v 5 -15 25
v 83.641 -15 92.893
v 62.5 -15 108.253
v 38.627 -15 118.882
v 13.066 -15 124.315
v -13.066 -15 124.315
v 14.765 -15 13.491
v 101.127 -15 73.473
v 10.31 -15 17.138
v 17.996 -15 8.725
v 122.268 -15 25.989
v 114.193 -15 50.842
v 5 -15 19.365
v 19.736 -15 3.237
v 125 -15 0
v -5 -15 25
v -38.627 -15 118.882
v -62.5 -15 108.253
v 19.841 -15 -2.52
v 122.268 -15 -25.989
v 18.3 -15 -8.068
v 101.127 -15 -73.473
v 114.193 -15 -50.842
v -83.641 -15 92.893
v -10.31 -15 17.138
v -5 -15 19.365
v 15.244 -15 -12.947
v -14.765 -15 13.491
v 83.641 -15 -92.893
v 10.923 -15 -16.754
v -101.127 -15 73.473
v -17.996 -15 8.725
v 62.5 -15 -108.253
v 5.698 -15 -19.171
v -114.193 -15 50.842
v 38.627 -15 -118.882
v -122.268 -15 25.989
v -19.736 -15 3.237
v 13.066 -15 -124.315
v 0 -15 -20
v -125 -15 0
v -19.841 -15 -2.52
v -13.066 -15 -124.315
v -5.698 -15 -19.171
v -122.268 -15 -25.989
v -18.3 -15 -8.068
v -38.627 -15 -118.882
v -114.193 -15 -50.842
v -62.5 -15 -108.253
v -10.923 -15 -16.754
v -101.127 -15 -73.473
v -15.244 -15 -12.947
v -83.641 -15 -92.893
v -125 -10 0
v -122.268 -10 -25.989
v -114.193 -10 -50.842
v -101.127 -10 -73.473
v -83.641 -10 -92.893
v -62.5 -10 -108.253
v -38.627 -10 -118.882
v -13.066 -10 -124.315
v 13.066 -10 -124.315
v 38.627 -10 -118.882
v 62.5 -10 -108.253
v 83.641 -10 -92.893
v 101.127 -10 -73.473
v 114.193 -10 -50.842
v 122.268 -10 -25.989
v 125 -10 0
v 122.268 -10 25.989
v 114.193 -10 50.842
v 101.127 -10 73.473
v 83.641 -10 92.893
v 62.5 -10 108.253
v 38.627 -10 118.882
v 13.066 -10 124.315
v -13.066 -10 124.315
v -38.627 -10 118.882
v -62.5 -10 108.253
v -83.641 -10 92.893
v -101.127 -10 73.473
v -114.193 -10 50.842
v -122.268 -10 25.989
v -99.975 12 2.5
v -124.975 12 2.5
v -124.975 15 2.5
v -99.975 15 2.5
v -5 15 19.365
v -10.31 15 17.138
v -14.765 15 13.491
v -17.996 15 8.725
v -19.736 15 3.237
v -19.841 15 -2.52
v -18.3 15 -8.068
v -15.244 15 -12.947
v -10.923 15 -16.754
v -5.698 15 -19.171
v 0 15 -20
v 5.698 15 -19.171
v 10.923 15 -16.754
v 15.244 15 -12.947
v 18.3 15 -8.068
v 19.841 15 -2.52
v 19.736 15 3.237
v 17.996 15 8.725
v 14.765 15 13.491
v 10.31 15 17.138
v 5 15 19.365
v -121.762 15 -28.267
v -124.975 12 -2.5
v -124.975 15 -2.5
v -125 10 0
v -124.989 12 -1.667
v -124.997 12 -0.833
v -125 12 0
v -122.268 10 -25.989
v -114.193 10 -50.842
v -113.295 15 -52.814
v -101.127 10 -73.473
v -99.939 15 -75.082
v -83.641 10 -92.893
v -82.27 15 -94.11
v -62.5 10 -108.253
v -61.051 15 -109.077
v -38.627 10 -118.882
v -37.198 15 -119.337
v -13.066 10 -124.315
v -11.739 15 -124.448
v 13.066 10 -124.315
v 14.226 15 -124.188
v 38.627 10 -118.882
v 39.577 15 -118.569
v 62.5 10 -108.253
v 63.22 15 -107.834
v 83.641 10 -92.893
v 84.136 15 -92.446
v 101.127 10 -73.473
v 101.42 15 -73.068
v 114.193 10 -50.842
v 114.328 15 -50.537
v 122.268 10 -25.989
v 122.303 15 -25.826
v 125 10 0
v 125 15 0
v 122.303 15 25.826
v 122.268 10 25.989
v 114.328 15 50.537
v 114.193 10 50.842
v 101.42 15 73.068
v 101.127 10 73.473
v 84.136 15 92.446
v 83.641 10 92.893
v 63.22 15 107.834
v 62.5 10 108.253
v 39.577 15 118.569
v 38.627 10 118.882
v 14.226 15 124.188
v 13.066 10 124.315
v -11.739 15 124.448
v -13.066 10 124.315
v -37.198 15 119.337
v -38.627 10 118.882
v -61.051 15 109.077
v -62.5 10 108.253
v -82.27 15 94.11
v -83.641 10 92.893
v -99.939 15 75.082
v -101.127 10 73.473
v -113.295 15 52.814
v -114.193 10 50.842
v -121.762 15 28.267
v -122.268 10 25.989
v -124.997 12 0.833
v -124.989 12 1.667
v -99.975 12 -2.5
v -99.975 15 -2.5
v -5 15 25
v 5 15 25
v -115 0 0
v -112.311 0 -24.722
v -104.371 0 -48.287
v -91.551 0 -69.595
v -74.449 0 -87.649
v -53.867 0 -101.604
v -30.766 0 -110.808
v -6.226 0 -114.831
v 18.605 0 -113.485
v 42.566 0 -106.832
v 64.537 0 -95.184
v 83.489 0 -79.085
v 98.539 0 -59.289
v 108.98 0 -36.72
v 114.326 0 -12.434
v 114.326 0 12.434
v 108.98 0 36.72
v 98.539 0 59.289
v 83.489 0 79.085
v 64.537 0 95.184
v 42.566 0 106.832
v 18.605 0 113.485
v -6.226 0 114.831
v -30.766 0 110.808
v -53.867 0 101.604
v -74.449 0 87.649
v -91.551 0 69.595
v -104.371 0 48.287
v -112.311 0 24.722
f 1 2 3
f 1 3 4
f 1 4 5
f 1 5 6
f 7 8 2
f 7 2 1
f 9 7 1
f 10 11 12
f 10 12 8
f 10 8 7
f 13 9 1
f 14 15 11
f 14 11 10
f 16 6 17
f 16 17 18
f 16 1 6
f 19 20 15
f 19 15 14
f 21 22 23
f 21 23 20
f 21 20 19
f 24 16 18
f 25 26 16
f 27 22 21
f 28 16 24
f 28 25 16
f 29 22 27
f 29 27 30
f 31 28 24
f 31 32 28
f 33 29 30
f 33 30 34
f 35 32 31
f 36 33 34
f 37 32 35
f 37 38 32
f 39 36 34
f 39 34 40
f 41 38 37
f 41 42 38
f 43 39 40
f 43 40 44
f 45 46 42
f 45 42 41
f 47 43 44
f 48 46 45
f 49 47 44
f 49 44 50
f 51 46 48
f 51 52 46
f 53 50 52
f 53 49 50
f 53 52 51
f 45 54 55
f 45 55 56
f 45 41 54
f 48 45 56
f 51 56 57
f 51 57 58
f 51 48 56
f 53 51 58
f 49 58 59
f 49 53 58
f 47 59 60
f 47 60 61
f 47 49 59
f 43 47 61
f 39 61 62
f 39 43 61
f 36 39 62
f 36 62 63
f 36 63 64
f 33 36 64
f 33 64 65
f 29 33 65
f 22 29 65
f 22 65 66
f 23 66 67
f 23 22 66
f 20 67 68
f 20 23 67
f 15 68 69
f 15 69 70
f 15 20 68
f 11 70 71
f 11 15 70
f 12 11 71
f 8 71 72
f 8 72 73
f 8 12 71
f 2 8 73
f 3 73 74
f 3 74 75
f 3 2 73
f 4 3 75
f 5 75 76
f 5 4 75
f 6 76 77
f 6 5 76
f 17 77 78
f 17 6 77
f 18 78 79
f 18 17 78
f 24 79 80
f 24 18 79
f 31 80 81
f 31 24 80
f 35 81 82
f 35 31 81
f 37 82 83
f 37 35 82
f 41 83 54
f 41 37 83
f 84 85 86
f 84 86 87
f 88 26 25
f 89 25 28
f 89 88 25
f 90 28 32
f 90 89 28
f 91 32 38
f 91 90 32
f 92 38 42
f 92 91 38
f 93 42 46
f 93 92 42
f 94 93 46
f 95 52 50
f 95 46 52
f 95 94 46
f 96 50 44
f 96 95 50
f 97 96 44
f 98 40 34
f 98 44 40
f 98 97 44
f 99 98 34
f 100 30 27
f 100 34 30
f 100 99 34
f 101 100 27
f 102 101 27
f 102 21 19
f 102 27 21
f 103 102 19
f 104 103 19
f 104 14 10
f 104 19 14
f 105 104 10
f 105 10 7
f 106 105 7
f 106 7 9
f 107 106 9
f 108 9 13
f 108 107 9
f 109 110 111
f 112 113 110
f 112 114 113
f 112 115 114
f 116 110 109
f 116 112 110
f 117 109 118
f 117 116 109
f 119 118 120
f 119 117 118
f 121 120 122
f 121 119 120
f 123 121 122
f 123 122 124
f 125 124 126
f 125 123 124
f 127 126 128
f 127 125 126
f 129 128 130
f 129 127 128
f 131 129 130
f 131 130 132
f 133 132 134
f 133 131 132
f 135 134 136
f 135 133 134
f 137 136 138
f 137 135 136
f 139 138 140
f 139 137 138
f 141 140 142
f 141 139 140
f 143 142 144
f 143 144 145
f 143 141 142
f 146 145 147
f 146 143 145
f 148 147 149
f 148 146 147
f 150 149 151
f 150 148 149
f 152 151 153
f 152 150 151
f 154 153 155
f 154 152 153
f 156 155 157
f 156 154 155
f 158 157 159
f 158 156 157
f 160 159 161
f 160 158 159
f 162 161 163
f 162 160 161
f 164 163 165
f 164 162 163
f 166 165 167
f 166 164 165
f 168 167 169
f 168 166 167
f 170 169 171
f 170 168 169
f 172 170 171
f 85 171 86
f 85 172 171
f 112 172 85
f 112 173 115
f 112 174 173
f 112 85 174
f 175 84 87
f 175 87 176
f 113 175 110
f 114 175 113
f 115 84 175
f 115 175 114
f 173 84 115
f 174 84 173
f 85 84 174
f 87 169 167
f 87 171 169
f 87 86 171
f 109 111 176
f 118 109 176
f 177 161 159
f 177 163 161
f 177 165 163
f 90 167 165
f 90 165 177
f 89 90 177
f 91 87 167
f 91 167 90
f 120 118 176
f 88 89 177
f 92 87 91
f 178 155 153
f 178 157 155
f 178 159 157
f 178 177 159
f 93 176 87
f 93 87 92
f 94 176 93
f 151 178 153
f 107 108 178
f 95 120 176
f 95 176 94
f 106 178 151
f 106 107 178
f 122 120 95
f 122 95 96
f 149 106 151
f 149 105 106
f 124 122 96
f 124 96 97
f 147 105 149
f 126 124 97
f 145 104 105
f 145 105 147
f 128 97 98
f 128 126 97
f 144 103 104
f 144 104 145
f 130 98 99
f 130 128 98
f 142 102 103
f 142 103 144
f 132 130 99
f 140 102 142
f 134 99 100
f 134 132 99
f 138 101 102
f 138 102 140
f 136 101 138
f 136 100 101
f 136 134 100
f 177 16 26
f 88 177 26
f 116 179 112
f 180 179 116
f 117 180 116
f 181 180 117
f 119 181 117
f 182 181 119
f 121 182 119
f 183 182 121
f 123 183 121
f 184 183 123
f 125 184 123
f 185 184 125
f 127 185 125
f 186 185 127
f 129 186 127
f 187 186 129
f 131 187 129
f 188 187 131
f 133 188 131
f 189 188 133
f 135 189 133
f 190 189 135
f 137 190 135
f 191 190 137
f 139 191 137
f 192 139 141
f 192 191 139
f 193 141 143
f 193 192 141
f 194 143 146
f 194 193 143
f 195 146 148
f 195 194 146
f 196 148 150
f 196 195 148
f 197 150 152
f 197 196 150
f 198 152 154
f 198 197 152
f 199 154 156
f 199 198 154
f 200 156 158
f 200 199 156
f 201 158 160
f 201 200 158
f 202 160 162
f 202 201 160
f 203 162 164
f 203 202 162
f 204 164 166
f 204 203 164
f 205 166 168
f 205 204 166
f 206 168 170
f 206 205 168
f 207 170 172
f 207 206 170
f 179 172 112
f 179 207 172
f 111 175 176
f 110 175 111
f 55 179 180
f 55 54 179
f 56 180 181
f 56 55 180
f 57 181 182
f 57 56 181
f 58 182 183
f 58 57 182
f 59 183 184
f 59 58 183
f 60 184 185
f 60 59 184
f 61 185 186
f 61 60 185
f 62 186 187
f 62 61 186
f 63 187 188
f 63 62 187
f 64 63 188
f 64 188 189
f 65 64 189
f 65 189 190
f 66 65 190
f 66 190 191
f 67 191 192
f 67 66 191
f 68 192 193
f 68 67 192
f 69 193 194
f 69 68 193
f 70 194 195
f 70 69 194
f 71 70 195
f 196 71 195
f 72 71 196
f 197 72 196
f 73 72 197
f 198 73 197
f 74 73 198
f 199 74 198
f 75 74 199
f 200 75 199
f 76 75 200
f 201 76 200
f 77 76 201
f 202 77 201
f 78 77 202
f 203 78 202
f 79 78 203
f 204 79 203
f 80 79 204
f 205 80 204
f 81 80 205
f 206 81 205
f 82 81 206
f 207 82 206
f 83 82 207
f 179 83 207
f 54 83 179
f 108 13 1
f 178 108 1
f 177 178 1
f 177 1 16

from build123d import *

# Parameters (mm, degrees)
CUT_EXTRUDE1_DEPTH = 180.30421077
CUT_EXTRUDE3_START = -3
CUT_EXTRUDE3_DEPTH = 3


with BuildPart() as part:
    # Sketch1 → Revolve1 (revolve)
    with BuildSketch(Plane.XY):
        Polygon((0, 15), (125, 15), (125, 10), (115, 0), (125, -10), (125, -15), (0, -15), align=None)
    revolve(axis=Axis((0, -15, 0), (0, -1, 0)))

    # Sketch2 → Cut-Extrude1 (cut, through all)
    with BuildSketch(Plane(origin=(0, 15, 0), x_dir=(-1, 0, 0), z_dir=(0, 1, 0))):
        with BuildLine():
            Line((-5, 19.364916731), (-5, 25))
            Line((-5, 25), (5, 25))
            Line((5, 25), (5, 19.364916731))
            ThreePointArc((5, 19.364916731), (0, -20), (-5, 19.364916731))
        make_face()
    extrude(amount=-CUT_EXTRUDE1_DEPTH, mode=Mode.SUBTRACT)

    # Sketch3 → Cut-Extrude3 (cut)
    with BuildSketch(Plane(origin=(0, 15, 0), x_dir=(-1, 0, 0), z_dir=(0, 1, 0)).offset(CUT_EXTRUDE3_START)):
        with BuildLine():
            Line((99.974997499, -2.5), (124.974997499, -2.5))
            ThreePointArc((124.974997499, -2.5), (125, 0), (124.974997499, 2.5))
            Line((124.974997499, 2.5), (99.974997499, 2.5))
            Line((99.974997499, 2.5), (99.974997499, -2.5))
        make_face()
    extrude(amount=CUT_EXTRUDE3_DEPTH, mode=Mode.SUBTRACT)


solid = part.part
